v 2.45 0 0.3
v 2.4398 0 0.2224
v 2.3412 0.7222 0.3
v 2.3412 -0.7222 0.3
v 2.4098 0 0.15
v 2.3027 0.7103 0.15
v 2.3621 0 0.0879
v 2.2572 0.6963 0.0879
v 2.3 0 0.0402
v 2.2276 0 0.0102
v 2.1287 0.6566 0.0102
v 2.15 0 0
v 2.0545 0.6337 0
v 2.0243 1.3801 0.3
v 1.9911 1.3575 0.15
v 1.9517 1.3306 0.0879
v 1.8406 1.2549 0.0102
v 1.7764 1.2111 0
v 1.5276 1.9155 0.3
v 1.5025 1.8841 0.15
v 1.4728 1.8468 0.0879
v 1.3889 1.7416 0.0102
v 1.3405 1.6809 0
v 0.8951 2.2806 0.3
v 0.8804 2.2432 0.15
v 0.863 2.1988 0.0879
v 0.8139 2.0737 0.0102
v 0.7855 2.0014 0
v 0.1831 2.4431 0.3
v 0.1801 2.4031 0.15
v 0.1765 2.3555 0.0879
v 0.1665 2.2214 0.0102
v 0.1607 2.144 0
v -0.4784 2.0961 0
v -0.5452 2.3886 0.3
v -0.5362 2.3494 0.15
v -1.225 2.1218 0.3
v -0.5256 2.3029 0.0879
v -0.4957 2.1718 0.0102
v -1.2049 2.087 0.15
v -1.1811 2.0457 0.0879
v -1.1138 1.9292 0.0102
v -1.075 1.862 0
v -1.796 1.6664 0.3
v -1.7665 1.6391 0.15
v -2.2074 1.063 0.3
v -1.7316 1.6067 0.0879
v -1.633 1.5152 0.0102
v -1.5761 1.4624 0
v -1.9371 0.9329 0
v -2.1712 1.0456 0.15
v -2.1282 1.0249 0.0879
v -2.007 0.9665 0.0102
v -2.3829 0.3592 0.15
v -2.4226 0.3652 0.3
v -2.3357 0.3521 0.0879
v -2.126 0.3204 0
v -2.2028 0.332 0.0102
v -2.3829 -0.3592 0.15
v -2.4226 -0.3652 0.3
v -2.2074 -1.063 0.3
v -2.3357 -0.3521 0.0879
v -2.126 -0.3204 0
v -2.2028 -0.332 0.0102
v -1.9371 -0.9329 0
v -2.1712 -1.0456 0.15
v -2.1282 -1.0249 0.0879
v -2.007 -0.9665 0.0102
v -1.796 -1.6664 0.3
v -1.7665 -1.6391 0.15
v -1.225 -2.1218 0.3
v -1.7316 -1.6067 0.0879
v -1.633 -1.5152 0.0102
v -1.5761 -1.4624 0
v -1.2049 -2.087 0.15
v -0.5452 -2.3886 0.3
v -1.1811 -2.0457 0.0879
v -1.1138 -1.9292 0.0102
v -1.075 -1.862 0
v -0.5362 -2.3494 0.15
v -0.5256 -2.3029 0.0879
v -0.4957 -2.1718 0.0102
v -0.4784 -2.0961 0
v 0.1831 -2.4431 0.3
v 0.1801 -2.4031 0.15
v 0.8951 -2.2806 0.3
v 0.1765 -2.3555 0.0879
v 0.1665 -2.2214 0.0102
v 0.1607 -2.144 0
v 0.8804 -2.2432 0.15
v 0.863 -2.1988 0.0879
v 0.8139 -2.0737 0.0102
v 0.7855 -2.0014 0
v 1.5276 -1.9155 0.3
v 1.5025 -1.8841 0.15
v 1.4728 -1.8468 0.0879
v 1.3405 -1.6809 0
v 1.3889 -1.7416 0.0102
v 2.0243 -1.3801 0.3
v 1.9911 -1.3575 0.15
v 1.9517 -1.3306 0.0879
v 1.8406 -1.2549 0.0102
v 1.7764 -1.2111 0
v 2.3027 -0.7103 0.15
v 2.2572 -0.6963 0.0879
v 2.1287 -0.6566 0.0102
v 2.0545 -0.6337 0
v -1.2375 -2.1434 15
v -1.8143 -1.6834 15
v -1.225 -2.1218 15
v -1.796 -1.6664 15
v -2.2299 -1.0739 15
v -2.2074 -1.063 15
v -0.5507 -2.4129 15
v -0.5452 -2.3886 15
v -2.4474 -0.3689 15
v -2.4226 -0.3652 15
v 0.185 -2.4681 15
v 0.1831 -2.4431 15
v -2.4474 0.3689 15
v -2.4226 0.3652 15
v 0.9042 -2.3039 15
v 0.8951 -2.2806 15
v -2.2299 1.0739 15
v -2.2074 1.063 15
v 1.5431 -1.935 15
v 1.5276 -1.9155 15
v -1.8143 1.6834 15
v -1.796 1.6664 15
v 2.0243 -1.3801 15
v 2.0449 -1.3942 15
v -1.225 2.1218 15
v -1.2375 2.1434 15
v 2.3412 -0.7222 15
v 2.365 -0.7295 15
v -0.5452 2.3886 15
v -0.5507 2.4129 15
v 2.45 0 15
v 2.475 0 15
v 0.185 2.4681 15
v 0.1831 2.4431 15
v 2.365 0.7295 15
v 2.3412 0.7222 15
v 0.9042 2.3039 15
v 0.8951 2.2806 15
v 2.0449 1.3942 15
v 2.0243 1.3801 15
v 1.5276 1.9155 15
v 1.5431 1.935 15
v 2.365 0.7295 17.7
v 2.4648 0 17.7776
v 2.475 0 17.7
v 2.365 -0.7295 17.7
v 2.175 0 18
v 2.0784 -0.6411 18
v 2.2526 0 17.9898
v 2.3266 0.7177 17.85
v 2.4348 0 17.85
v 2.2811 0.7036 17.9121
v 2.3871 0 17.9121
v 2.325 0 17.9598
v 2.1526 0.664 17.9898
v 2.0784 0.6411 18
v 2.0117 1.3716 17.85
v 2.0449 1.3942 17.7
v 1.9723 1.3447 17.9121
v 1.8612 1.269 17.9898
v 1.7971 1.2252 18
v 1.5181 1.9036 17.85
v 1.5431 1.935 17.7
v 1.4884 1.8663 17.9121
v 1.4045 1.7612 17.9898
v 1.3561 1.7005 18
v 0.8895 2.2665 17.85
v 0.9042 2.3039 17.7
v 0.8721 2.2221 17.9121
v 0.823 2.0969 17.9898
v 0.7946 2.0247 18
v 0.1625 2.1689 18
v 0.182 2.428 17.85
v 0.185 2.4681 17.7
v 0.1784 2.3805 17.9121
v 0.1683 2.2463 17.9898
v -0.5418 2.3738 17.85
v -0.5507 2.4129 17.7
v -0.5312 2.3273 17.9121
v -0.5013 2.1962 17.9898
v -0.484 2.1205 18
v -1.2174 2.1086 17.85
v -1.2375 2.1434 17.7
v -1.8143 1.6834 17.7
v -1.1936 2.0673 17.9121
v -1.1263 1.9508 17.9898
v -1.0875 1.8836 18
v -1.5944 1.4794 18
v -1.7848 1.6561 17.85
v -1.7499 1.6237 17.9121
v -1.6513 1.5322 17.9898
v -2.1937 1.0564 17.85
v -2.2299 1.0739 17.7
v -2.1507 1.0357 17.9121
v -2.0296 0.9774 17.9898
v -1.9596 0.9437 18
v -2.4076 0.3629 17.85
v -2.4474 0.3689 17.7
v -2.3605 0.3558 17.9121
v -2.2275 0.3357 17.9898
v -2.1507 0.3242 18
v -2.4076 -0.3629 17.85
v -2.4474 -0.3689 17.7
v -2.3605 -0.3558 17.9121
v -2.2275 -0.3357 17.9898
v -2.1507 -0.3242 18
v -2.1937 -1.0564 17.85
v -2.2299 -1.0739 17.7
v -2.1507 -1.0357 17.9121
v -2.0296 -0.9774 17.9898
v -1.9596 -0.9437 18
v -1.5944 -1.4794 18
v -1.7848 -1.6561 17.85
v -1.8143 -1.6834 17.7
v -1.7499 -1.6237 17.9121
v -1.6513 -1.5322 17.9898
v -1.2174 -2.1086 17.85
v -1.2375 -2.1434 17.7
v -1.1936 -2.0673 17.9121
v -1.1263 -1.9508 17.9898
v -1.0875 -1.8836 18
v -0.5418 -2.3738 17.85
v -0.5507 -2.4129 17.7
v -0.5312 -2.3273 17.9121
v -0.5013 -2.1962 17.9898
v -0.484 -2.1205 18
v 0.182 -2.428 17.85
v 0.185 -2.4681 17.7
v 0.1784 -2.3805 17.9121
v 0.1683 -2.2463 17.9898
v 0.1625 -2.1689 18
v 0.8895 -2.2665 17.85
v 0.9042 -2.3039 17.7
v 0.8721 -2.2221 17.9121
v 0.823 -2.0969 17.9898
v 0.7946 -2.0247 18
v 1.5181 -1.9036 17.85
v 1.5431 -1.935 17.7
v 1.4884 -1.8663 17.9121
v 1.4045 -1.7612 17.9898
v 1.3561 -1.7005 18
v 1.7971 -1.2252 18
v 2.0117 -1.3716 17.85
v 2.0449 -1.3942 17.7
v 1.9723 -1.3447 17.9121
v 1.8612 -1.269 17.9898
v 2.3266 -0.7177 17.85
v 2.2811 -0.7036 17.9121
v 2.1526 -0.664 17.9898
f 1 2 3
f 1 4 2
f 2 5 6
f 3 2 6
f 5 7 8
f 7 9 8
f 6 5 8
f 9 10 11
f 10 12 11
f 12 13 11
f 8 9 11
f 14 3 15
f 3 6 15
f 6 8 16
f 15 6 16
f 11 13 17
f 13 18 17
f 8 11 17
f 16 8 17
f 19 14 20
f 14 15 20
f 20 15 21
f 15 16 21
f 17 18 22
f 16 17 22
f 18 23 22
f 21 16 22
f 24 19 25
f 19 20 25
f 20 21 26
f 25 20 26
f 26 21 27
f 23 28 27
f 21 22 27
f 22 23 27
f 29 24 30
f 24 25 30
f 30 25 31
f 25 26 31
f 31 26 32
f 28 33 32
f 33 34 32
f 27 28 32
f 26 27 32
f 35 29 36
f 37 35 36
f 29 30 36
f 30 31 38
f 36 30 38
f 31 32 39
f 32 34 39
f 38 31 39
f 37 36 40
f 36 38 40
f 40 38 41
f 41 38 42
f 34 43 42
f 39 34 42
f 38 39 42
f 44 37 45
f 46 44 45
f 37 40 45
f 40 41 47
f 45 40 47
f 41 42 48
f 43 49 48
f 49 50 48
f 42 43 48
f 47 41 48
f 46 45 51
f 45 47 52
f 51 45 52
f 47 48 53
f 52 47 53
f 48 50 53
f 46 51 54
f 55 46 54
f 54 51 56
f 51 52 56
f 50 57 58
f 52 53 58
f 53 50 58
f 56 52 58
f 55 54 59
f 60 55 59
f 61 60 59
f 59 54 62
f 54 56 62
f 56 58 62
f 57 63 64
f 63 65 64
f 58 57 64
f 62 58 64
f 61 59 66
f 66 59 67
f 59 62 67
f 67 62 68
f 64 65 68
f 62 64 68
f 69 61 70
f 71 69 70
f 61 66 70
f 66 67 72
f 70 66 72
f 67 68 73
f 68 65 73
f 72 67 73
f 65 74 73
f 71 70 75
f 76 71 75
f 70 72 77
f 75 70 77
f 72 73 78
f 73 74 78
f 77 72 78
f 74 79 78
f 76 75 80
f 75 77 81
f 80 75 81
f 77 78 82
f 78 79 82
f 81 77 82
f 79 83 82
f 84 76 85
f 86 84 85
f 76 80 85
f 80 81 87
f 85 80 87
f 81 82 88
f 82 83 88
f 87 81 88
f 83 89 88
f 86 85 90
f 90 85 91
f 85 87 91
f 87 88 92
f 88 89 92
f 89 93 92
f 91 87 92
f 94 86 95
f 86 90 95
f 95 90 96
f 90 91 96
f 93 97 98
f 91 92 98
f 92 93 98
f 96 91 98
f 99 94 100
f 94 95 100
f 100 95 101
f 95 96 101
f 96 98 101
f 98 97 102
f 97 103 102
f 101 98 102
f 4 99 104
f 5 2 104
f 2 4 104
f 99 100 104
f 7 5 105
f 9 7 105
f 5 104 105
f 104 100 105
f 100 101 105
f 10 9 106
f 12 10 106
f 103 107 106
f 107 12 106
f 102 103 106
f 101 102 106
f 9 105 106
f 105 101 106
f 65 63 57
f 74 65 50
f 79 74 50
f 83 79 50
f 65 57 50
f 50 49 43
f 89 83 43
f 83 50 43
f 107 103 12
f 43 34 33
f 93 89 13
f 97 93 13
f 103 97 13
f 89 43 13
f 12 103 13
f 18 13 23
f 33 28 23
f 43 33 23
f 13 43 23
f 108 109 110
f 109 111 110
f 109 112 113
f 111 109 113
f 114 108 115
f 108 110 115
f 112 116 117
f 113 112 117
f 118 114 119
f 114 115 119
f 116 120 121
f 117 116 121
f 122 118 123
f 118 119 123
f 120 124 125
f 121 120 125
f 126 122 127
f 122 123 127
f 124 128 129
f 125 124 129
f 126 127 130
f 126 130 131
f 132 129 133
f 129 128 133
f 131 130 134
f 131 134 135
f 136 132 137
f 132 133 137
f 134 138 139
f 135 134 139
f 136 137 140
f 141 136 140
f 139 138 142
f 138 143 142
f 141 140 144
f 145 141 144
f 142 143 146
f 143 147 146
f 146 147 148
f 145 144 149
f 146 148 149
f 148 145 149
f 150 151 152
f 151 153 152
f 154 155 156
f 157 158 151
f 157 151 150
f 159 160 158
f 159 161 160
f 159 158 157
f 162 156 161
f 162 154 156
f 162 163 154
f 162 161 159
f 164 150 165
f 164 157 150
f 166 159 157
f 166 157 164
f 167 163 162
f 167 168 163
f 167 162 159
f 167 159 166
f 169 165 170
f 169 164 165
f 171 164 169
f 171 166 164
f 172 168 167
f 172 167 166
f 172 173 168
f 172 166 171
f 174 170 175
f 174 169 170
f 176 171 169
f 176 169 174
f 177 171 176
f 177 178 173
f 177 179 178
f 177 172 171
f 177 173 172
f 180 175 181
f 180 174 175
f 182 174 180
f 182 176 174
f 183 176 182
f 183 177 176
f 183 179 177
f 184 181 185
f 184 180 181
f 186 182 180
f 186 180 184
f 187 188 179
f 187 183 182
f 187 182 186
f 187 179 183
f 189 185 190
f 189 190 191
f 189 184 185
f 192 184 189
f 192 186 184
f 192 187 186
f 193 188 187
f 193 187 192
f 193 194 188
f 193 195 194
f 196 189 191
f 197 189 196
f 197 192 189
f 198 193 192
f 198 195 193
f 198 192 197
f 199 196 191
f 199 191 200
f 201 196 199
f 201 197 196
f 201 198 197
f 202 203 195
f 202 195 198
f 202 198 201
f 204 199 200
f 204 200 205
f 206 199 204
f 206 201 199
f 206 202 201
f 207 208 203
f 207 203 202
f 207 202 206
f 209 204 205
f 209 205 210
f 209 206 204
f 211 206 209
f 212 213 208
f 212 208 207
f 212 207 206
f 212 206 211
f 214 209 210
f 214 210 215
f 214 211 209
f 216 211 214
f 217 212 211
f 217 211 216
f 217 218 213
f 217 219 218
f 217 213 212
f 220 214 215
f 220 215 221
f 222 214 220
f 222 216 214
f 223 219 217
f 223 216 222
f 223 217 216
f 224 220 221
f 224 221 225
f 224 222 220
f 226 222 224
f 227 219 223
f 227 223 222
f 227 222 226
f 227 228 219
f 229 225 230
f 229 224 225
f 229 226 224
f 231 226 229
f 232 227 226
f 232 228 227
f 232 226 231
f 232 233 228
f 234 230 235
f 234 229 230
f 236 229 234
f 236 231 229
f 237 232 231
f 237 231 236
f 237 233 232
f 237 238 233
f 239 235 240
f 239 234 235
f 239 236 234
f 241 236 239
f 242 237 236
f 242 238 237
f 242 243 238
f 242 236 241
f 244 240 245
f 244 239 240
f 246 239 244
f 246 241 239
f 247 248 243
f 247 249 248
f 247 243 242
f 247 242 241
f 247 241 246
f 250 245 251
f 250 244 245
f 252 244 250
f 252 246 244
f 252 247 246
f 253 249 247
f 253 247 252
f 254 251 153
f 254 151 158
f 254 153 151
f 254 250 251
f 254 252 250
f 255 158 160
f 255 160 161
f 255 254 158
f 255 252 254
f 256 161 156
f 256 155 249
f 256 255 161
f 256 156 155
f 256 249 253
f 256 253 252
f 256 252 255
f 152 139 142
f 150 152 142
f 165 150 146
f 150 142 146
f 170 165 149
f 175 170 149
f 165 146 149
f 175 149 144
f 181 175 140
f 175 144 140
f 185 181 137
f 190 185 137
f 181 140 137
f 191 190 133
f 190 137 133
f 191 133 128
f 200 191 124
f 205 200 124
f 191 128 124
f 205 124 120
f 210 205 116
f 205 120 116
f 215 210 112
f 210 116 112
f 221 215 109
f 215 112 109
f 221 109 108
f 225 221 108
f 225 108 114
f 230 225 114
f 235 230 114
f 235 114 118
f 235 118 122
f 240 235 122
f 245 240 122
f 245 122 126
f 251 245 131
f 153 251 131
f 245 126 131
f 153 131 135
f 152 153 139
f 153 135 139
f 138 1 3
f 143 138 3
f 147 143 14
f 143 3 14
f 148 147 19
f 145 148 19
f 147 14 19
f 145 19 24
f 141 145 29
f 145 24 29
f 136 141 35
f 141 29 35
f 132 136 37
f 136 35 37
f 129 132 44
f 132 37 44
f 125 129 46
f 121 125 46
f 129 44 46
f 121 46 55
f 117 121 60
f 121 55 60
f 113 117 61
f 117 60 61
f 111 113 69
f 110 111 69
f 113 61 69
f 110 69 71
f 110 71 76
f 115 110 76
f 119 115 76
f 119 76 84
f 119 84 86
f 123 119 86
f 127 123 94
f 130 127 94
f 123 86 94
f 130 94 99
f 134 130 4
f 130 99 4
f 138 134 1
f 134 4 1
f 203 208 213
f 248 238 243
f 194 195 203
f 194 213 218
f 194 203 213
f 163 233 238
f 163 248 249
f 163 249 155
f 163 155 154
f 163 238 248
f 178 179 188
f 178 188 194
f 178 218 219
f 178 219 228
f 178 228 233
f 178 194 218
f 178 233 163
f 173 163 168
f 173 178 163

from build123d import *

# Parameters (mm, degrees)
SKETCH_1_R      = 2.45
EXTRUDE_1_DEPTH = 15
SKETCH_2_R      = 2.475
EXTRUDE_2_DEPTH = 3
FILLET_1_R      = 0.3
FILLET_2_R      = 0.3


with BuildPart() as part:
    # 스케치1 → 보스-돌출1 (new body)
    with BuildSketch(Plane.XY):
        Circle(SKETCH_1_R)
    extrude(amount=EXTRUDE_1_DEPTH)

    # 스케치2 → 보스-돌출2 (add)
    with BuildSketch(Plane.XY.offset(15)):
        Circle(SKETCH_2_R)
    extrude(amount=EXTRUDE_2_DEPTH)

    # 필렛1
    fillet_1_edges = [part.edges().sort_by_distance(p)[0] for p in [
        (-2.475, 0, 18),
    ]]
    fillet(fillet_1_edges, radius=FILLET_1_R)

    # 필렛2
    fillet_2_edges = [part.edges().sort_by_distance(p)[0] for p in [
        (-2.45, 0, 0),
    ]]
    fillet(fillet_2_edges, radius=FILLET_2_R)


solid = part.part
